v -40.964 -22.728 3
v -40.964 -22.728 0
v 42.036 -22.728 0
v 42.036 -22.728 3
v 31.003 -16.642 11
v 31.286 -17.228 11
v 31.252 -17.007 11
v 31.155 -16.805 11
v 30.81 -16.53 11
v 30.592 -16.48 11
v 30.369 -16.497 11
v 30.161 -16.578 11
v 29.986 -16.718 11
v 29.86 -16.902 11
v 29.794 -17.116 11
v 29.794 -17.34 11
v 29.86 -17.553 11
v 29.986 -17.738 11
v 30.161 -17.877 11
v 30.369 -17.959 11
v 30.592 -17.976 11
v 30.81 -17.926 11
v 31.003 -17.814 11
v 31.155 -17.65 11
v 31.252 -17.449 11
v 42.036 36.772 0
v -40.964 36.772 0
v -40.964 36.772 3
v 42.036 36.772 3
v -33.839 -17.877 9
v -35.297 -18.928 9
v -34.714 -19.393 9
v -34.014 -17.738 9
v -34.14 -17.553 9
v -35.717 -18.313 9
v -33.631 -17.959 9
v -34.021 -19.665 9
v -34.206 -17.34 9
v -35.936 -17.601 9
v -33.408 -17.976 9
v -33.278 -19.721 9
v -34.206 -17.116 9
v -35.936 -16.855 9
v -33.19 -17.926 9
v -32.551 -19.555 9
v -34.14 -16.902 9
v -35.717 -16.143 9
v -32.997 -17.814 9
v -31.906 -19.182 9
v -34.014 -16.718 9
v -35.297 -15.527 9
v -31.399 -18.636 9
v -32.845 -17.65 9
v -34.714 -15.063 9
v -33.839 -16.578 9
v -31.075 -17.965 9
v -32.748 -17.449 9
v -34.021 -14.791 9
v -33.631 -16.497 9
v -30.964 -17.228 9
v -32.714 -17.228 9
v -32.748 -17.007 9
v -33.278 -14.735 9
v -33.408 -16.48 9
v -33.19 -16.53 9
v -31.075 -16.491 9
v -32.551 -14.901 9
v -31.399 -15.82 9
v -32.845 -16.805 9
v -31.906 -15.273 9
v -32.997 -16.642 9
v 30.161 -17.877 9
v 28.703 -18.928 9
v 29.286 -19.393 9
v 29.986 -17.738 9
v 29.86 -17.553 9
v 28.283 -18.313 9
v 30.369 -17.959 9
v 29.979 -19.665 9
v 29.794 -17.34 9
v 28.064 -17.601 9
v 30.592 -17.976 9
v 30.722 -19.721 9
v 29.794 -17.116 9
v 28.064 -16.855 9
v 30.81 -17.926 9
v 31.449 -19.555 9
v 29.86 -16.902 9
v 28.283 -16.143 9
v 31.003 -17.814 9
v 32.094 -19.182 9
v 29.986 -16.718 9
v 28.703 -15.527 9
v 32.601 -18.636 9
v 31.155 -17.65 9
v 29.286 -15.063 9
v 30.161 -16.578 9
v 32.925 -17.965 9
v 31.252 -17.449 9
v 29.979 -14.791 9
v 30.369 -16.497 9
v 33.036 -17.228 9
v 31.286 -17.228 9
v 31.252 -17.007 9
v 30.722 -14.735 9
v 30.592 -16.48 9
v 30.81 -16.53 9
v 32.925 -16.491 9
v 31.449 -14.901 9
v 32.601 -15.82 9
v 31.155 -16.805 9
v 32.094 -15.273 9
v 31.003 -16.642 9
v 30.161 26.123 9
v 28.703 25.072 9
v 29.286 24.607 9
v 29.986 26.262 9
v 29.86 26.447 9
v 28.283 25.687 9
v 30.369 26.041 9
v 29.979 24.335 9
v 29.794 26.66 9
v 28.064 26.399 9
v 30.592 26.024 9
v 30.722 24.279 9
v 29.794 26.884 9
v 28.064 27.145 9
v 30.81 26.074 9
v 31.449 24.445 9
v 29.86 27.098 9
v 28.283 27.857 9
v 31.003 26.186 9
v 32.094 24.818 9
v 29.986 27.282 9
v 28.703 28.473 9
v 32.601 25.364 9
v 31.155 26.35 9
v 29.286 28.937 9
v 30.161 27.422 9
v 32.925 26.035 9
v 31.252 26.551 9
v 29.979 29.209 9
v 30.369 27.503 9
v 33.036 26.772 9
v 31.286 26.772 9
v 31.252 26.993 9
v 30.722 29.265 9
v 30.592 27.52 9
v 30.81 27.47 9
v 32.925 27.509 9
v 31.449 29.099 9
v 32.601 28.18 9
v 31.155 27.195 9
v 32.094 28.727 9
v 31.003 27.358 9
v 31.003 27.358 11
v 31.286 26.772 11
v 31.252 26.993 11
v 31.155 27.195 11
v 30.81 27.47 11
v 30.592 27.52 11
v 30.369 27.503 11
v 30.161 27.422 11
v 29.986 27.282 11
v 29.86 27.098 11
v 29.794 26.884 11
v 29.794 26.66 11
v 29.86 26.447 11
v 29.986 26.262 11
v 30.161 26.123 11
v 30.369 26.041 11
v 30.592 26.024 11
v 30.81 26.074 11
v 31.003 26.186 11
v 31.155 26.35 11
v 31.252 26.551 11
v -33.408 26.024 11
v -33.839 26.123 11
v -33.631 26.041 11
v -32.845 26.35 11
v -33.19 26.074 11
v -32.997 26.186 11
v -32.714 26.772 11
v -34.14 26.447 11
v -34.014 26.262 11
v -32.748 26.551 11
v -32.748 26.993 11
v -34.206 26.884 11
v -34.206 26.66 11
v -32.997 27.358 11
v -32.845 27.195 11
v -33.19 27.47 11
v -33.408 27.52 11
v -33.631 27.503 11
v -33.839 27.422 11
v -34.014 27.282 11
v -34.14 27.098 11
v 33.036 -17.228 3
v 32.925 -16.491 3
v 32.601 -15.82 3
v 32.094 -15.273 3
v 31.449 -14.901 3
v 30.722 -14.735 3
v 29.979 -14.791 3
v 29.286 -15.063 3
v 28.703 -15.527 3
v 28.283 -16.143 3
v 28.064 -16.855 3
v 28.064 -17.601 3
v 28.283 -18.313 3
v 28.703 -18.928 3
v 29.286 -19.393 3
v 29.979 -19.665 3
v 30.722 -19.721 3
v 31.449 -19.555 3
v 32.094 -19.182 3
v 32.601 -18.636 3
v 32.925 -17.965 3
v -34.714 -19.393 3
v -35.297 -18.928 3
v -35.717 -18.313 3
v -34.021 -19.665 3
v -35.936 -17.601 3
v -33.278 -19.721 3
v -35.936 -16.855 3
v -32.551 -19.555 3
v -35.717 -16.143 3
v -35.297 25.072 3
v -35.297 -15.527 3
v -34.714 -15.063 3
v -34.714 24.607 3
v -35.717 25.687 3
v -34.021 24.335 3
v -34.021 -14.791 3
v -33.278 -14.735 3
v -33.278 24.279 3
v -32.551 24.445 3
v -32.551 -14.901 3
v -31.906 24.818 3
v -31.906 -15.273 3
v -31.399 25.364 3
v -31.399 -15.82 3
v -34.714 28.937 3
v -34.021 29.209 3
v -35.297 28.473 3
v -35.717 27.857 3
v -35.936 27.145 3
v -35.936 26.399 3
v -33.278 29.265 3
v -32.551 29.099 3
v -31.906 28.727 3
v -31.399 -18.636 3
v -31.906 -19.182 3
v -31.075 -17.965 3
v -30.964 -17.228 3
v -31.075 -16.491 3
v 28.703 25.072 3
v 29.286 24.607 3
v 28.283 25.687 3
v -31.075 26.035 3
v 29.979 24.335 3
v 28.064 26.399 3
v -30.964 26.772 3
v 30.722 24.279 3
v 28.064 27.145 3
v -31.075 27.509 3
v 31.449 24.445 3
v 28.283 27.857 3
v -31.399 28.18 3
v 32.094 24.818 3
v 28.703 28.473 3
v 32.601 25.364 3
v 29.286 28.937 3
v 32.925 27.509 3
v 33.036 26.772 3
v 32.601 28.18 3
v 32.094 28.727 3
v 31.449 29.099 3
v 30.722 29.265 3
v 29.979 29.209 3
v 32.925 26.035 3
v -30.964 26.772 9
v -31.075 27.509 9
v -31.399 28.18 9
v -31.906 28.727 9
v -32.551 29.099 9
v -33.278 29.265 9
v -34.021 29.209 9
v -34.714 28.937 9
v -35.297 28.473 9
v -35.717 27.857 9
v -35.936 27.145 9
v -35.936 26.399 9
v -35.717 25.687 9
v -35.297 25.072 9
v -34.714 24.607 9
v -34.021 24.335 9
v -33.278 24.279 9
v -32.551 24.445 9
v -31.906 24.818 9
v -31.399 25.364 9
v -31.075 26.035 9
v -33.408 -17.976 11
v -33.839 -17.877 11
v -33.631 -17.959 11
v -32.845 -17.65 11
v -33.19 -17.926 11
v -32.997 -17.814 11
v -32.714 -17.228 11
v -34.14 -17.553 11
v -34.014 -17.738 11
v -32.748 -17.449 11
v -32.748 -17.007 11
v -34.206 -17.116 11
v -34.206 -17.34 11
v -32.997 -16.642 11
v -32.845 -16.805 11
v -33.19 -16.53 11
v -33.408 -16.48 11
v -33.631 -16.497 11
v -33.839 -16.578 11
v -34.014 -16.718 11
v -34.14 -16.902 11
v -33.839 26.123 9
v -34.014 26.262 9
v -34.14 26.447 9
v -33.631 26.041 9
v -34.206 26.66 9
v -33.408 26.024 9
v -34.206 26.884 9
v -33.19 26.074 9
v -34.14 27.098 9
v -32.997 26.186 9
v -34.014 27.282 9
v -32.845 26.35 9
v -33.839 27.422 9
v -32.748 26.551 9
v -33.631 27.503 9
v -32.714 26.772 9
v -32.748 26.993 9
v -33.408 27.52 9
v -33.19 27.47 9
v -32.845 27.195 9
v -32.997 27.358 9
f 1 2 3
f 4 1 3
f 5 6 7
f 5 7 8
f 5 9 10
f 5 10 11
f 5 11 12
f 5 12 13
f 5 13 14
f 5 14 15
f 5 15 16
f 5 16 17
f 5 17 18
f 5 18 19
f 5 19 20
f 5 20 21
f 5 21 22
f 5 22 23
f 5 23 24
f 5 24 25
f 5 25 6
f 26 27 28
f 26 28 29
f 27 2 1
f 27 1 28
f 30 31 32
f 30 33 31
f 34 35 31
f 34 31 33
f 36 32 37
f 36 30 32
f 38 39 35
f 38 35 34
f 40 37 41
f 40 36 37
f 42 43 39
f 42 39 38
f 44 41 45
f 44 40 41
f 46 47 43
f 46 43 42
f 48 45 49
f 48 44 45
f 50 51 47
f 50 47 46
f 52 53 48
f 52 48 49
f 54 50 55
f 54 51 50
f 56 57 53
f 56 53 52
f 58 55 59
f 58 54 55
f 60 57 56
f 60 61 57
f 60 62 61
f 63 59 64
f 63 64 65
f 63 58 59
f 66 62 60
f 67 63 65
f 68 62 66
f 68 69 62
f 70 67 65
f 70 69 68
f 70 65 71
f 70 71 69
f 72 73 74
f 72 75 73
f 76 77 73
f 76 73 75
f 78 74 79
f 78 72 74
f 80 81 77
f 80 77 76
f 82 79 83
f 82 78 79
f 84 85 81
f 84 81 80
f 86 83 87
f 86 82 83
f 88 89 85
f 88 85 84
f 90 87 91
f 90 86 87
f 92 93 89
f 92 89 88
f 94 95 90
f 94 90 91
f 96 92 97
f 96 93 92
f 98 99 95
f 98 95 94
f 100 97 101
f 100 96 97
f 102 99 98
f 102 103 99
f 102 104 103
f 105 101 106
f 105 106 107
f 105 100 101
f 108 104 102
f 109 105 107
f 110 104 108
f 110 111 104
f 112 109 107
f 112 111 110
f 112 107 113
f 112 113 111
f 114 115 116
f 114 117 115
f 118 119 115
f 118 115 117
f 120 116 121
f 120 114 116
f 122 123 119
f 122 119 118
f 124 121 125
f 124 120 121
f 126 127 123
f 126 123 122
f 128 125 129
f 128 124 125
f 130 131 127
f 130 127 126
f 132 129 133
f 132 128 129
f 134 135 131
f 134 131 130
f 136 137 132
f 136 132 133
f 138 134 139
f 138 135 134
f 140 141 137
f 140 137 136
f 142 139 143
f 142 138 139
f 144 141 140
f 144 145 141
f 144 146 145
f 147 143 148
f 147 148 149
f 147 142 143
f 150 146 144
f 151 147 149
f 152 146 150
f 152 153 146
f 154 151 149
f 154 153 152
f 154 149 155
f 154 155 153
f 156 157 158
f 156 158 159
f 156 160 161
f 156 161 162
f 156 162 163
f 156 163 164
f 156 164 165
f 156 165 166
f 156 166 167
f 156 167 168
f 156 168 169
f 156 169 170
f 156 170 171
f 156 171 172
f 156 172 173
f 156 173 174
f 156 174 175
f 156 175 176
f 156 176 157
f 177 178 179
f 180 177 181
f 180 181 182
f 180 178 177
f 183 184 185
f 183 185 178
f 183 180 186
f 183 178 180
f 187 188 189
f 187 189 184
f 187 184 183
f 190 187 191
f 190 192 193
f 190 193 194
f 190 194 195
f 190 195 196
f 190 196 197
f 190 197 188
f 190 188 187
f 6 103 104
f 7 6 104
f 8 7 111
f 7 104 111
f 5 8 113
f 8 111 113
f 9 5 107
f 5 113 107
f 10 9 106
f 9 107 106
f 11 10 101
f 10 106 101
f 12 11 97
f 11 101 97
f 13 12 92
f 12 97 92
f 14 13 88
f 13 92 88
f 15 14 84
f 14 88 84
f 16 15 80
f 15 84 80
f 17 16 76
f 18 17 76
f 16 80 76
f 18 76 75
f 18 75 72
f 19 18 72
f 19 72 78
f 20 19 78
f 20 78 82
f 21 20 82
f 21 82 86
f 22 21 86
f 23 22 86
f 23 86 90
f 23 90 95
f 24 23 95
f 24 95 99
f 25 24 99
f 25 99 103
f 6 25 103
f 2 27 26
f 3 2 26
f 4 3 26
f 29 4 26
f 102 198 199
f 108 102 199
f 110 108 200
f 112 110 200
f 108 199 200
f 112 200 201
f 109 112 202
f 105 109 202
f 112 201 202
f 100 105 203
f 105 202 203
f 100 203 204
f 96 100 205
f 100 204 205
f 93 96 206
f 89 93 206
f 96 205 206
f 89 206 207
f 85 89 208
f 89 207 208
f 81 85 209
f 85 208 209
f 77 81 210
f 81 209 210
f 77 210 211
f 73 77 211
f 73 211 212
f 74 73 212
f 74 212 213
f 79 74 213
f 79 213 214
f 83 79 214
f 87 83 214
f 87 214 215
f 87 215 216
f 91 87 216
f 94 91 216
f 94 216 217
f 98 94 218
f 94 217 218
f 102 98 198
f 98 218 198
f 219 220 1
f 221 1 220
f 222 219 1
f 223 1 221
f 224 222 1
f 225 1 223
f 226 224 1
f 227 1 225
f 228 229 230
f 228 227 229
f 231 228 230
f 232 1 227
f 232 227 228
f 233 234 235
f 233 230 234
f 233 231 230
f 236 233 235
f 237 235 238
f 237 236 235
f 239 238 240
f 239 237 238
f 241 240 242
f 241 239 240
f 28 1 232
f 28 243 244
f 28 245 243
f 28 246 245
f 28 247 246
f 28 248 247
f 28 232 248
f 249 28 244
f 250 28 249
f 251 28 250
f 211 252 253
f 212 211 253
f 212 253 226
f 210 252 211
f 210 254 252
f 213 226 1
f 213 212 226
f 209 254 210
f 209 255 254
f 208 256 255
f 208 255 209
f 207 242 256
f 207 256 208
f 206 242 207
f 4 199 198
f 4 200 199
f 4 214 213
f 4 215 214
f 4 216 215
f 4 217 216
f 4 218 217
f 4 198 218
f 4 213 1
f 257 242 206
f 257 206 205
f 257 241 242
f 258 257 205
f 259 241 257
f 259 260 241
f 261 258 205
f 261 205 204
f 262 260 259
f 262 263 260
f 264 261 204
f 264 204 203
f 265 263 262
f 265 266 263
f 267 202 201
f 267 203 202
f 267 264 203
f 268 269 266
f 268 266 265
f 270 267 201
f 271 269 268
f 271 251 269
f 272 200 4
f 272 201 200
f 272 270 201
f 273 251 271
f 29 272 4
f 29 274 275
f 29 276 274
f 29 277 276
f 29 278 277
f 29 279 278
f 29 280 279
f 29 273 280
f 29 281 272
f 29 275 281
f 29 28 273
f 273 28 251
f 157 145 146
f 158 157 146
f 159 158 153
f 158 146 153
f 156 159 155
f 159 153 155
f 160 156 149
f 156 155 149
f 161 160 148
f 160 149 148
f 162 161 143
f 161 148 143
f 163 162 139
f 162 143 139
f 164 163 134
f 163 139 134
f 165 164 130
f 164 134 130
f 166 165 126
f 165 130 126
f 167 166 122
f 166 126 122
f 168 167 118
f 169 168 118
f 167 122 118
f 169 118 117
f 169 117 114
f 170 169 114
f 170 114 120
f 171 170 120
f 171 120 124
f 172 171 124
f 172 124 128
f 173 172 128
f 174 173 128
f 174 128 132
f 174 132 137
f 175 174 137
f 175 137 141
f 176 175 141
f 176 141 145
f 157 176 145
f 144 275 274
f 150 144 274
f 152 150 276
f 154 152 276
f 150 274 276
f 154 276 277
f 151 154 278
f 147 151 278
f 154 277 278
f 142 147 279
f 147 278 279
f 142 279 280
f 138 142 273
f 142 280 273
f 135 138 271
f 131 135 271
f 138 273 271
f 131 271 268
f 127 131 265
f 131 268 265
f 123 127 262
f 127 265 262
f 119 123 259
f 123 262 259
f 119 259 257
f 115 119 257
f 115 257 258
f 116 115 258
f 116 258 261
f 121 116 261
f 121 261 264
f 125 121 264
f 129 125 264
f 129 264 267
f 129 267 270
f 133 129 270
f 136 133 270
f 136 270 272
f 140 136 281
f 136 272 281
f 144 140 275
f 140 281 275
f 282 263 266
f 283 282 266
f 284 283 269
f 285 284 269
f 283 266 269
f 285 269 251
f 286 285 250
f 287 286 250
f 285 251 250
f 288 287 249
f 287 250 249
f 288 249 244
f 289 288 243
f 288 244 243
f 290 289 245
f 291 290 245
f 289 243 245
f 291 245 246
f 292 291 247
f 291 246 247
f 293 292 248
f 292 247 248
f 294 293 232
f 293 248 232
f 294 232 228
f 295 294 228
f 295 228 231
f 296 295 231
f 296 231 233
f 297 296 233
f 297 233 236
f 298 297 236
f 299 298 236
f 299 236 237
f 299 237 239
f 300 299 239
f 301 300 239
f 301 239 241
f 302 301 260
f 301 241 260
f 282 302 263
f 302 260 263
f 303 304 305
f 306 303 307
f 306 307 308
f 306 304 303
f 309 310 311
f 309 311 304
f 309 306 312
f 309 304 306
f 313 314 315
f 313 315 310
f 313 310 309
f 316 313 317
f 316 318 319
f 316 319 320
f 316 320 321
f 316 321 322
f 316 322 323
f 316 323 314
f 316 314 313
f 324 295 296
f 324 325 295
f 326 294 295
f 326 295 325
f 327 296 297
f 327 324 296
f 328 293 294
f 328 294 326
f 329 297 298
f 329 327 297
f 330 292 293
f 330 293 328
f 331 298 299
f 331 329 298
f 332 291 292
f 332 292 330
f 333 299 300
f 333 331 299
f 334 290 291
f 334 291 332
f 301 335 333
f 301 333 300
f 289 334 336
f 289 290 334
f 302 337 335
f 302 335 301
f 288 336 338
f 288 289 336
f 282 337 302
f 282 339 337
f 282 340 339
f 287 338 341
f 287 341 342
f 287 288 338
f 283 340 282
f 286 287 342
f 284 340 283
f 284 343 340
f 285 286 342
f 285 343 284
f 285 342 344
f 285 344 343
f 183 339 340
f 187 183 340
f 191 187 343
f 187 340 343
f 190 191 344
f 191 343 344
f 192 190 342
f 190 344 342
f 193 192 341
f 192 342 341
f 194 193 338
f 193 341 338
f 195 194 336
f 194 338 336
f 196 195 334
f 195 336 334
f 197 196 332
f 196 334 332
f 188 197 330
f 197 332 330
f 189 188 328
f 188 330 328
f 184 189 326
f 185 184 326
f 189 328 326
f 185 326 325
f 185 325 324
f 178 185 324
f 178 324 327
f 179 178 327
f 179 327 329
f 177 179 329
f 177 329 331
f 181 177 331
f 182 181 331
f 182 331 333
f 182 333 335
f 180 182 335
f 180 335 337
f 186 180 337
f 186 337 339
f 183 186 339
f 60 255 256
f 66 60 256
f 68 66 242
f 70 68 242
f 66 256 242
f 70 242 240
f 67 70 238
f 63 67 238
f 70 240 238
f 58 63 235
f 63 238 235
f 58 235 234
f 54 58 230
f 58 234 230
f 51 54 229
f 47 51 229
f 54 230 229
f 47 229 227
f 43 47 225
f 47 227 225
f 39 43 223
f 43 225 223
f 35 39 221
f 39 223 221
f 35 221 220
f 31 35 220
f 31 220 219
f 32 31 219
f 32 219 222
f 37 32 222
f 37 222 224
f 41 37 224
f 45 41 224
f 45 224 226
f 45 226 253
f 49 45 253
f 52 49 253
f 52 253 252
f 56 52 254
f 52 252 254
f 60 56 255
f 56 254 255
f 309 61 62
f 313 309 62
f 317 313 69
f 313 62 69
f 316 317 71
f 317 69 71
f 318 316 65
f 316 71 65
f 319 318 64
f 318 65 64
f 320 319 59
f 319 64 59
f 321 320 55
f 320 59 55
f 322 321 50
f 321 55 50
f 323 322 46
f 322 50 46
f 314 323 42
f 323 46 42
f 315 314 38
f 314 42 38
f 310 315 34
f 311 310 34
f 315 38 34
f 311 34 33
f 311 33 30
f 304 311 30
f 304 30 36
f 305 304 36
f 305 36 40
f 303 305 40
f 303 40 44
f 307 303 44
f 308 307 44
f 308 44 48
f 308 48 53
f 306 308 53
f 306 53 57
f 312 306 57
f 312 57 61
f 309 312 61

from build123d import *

# Parameters (mm, degrees)
F0_W     = 83
F0_H     = 59.5
F1_DEPTH = 3
F2_R     = 2.5
F3_DEPTH = 6
F4_R     = 0.75
F5_DEPTH = 8


with BuildPart() as f1:
    # F0 (on Top) → F1 (new body)
    with BuildSketch(Plane.XY):
        with Locations((0.53559, 7.022104)):
            Rectangle(F0_W, F0_H)
    extrude(amount=F1_DEPTH)

    # F2 (on face) → F3 (join)
    with BuildSketch(Plane.XY.offset(3)):
        with Locations((-33.46441, 26.772104)):
            Circle(F2_R)
        with Locations((30.53559, 26.772104)):
            Circle(F2_R)
        with Locations((-33.46441, -17.227896)):
            Circle(F2_R)
        with Locations((30.53559, -17.227896)):
            Circle(F2_R)
    extrude(amount=F3_DEPTH)

    # F4 (on face) → F5 (join)
    with BuildSketch(Plane.XY.offset(3)):
        with Locations((-33.46441, 26.772104)):
            Circle(F4_R)
        with Locations((30.53559, 26.772104)):
            Circle(F4_R)
        with Locations((30.53559, -17.227896)):
            Circle(F4_R)
        with Locations((-33.46441, -17.227896)):
            Circle(F4_R)
    extrude(amount=F5_DEPTH)


solid = f1.part
